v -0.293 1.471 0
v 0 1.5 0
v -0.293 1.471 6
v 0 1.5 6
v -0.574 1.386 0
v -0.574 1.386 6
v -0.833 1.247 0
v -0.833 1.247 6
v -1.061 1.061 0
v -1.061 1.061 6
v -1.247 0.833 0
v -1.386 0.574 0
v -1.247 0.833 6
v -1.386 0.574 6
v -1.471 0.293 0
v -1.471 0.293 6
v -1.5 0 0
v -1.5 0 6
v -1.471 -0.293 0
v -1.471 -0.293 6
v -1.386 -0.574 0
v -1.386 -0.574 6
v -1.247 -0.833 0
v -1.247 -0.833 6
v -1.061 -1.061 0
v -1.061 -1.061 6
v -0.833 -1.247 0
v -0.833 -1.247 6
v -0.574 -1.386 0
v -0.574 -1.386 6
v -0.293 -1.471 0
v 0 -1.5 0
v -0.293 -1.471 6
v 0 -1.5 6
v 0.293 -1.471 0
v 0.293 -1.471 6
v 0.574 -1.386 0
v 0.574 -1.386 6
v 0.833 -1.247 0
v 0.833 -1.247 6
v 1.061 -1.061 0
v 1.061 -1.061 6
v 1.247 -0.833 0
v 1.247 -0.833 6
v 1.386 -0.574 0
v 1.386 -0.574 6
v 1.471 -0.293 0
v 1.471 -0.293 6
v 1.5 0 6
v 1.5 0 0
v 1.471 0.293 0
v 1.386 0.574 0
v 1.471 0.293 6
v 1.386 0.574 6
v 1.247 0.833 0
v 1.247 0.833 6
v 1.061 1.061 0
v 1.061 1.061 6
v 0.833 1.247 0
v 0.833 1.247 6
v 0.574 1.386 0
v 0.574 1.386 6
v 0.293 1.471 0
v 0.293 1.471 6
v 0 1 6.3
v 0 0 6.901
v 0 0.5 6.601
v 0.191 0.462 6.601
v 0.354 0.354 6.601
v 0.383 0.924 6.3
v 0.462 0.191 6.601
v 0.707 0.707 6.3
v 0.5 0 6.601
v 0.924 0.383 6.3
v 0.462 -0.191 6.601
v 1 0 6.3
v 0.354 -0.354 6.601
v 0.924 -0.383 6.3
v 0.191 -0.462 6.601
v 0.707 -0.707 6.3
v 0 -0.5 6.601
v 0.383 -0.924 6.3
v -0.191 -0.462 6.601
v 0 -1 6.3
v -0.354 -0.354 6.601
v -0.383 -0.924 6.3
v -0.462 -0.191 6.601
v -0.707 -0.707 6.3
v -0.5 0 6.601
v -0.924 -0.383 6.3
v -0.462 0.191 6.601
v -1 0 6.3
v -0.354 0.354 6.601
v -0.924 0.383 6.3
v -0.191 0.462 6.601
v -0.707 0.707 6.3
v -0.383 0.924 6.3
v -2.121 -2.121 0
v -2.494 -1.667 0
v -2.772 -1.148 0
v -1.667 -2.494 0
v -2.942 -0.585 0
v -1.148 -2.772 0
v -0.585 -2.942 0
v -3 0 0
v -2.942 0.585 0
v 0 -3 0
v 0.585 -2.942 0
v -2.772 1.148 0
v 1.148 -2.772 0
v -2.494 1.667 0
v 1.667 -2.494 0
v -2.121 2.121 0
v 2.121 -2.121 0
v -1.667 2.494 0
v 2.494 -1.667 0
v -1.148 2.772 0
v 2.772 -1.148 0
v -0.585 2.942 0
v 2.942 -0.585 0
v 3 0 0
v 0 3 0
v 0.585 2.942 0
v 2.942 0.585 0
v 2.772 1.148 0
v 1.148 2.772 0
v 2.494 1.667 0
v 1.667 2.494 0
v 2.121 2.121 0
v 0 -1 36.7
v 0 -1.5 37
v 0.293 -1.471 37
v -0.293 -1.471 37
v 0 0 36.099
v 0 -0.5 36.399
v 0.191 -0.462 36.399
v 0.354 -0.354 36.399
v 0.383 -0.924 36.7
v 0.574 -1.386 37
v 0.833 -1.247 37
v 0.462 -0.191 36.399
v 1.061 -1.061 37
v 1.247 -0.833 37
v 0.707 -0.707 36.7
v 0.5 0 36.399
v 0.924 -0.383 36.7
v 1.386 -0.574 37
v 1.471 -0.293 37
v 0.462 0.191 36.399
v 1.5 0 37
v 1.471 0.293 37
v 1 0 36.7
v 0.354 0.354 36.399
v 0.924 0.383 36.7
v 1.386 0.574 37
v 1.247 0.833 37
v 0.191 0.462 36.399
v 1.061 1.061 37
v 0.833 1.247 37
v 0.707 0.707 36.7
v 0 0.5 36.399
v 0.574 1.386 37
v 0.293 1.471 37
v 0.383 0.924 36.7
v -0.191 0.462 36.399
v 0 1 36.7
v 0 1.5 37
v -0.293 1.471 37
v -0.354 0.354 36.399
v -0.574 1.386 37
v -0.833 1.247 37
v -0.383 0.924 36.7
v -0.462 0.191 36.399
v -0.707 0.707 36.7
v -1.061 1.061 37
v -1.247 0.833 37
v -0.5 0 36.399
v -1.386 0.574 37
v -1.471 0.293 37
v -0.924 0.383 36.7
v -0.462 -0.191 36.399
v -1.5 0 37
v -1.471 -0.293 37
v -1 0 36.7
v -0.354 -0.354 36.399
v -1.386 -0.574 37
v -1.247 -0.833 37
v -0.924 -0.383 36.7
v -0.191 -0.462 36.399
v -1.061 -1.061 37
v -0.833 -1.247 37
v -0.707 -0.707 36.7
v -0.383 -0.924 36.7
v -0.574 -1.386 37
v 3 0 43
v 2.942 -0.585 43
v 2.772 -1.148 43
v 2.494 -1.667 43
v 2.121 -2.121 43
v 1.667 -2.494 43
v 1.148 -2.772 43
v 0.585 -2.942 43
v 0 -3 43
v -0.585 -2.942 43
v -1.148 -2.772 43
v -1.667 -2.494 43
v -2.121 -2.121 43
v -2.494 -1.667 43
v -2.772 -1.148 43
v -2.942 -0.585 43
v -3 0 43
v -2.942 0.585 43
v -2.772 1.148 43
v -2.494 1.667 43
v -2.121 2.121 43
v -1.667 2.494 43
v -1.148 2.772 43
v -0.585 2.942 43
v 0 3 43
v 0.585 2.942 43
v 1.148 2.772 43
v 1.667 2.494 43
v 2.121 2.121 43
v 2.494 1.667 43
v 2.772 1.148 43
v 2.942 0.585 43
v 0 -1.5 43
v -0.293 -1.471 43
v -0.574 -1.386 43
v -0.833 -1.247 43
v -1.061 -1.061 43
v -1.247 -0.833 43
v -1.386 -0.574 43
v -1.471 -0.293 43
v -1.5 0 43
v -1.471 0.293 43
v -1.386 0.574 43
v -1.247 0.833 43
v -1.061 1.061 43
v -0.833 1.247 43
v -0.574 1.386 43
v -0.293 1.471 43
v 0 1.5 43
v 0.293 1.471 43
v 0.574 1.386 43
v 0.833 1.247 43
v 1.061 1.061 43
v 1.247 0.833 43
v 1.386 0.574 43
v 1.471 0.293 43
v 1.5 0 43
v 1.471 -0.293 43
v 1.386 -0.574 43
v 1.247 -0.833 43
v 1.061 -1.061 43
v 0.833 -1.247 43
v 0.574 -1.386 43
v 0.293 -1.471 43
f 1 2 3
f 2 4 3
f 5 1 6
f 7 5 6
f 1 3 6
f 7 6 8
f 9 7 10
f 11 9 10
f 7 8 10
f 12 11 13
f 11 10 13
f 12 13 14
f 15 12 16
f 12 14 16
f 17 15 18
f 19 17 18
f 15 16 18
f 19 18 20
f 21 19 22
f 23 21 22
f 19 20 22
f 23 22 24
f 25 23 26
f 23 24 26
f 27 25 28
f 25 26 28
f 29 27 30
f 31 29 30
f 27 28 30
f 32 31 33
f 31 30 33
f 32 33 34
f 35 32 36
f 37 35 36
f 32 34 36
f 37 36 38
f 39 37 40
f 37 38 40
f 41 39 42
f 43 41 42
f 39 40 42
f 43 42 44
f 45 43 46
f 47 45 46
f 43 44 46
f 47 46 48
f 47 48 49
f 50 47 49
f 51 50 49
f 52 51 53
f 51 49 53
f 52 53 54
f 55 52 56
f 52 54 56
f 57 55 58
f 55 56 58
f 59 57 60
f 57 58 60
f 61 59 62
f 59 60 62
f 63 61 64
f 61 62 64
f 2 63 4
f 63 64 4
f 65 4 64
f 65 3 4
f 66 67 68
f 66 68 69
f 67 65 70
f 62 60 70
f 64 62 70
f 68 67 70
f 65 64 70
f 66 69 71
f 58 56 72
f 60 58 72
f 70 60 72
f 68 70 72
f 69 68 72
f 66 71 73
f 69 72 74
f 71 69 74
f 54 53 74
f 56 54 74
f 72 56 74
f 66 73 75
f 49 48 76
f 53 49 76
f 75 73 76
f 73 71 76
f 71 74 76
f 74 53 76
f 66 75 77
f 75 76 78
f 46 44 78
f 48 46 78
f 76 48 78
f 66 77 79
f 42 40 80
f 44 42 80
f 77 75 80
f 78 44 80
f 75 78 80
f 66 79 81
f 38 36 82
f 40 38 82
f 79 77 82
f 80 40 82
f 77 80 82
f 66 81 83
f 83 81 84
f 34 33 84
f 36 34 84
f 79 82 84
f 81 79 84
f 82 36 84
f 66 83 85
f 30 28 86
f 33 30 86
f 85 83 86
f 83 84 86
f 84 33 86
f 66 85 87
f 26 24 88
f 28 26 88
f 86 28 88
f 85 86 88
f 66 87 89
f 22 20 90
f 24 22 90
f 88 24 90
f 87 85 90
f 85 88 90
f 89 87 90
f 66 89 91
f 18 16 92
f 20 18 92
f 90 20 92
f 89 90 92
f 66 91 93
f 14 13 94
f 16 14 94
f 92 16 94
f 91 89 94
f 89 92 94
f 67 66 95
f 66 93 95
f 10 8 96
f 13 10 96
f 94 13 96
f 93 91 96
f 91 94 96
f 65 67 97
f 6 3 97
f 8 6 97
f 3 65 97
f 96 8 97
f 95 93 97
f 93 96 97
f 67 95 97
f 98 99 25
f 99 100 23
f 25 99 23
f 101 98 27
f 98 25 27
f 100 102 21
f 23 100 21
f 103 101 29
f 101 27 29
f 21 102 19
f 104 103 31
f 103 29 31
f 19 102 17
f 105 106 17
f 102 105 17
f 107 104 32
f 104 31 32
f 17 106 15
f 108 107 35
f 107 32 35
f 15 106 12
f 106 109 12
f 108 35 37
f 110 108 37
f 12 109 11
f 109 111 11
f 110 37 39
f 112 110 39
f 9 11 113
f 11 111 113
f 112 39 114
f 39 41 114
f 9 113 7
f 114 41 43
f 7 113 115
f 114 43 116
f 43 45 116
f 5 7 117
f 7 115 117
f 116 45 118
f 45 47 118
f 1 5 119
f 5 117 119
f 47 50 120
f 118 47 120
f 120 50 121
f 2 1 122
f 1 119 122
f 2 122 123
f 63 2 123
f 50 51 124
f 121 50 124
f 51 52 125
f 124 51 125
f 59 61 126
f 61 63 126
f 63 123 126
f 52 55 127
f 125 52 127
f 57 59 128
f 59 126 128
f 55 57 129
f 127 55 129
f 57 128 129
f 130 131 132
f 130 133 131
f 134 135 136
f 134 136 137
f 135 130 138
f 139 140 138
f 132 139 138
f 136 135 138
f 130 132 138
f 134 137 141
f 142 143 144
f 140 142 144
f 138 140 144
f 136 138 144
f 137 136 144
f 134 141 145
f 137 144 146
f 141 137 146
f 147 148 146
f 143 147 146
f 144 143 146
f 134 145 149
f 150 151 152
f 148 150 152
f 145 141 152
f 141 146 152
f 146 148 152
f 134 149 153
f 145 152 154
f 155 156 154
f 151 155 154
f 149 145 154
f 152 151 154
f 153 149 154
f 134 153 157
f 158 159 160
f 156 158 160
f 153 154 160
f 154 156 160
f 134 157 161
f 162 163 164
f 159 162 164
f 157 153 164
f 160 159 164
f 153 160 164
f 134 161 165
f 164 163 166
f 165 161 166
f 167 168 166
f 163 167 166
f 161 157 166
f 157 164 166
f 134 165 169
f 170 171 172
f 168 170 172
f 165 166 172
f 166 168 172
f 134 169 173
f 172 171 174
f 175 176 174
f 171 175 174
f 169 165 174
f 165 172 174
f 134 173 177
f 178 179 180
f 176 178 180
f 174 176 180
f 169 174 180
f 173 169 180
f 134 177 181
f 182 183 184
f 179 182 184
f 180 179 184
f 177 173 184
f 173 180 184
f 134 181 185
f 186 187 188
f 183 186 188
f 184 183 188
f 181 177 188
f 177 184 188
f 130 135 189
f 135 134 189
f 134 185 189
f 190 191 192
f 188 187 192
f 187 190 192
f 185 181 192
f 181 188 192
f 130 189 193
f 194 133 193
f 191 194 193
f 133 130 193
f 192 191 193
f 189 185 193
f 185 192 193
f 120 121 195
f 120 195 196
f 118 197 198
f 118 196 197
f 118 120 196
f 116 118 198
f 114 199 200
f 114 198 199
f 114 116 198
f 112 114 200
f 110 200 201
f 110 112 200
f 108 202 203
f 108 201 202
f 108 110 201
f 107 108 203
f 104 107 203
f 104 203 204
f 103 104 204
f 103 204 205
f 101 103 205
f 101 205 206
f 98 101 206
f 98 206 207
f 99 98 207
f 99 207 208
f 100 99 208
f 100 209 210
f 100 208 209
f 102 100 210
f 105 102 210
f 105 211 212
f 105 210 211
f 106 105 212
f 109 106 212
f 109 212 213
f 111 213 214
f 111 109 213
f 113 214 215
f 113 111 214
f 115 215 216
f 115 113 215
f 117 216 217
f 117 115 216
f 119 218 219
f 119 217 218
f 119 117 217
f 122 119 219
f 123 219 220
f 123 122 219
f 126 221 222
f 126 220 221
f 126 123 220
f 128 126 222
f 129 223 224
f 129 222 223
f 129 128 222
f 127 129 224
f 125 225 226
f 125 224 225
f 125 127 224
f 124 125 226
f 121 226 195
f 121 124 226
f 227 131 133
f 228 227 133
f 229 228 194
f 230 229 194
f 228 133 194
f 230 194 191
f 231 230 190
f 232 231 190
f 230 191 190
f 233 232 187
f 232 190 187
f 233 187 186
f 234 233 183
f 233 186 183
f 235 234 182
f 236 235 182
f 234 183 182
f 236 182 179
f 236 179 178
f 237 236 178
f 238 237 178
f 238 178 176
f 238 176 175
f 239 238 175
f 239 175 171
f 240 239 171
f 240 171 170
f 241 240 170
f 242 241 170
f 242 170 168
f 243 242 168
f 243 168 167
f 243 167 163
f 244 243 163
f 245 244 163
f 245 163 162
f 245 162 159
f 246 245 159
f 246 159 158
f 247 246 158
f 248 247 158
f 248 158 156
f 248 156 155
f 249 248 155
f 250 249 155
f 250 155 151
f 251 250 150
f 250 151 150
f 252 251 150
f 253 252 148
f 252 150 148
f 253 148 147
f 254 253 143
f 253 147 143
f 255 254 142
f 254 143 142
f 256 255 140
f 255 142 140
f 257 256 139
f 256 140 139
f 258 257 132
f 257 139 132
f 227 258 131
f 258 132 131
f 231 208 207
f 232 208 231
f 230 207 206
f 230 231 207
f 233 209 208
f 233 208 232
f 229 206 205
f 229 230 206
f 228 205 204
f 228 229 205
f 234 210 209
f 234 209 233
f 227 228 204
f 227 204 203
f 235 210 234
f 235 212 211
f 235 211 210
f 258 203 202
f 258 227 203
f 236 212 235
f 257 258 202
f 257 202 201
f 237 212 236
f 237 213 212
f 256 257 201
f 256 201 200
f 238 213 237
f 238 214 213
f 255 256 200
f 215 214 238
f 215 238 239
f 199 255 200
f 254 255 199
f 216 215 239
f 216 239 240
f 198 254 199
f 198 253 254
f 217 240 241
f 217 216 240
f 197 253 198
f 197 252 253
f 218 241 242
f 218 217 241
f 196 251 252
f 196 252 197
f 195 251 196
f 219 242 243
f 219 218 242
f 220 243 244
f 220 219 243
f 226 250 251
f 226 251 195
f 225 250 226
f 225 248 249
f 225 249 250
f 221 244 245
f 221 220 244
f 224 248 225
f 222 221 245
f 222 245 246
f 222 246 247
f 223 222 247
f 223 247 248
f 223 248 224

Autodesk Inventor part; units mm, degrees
ref_plane "YZ Plane" through (0, 0, 0) normal (1, 0, 0) x (0, 1, 0)
ref_plane "XZ Plane" through (0, 0, 0) normal (0, 1, 0) x (-1, 0, 0)
ref_plane "XY Plane" through (0, 0, 0) normal (0, 0, 1) x (1, 0, 0)
sketch "スケッチ1" plane through (0, 0, 0) normal (0, 0, 1) x (1, 0, 0)
  circle A0 centre (0, 0) radius 3
  dimension "d0" = 6
extrude "押し出し1" add sketch "スケッチ1" along normal blind 43
hole "穴1" at (0, 0, 0) direction (0, 0, 1) diameter 3 depth 6 tip angle 118
sketch "スケッチ2" plane through (0, 0, 43) normal (0, 0, 1) x (1, 0, 0)
  circle A0 centre (0, 0) radius 3 projected
hole "穴2" at (0, 0, 43) direction (0, 0, -1) diameter 3 depth 6 tip angle 118
properties part number "スペーサ　m3-l42" material "アルミニウム 2014-T4"
